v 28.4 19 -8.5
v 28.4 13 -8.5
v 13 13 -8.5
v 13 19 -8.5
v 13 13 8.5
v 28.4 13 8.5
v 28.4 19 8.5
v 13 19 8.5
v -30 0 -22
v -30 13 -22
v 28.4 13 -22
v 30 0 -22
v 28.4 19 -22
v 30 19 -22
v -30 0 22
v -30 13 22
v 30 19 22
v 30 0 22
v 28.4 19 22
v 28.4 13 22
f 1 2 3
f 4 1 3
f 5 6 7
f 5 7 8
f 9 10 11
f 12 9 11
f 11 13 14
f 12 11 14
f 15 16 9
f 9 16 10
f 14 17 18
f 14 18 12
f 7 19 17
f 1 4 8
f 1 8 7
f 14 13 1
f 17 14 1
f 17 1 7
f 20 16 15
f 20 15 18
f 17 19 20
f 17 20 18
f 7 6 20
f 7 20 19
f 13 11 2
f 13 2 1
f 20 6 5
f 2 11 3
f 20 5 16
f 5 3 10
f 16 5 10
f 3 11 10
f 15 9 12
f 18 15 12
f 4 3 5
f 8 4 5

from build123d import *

# Parameters (mm, degrees)
SKETCH_1_W          = 60
SKETCH_1_H          = 44
EXTRUDE_1_DEPTH     = 19
SKETCH_2_W          = 58.4
SKETCH_2_H          = 6
CUT_EXTRUDE_1_DEPTH = 57.542019773
SKETCH_3_W          = 15.4
SKETCH_3_H          = 17
EXTRUDE_2_DEPTH     = 6


with BuildPart() as part:
    # 草图1 → 凸台-拉伸1 (new body)
    with BuildSketch(Plane(origin=(0, 19, 0), x_dir=(1, 0, 0), z_dir=(0, 1, 0))):
        Rectangle(SKETCH_1_W, SKETCH_1_H)
    extrude(amount=-EXTRUDE_1_DEPTH)

    # 草图2 → 切除-拉伸1 (cut, through all)
    with BuildSketch(Plane(origin=(0, 0, -22), x_dir=(-1, 0, 0), z_dir=(0, 0, -1))):
        with Locations((0.8, 16)):
            Rectangle(SKETCH_2_W, SKETCH_2_H)
    extrude(amount=-CUT_EXTRUDE_1_DEPTH, mode=Mode.SUBTRACT)

    # 草图3 → 凸台-拉伸2 (add)
    with BuildSketch(Plane(origin=(0, 13, 0), x_dir=(-1, 0, 0), z_dir=(0, 1, 0))):
        with Locations((-20.7, 0)):
            Rectangle(SKETCH_3_W, SKETCH_3_H)
    extrude(amount=EXTRUDE_2_DEPTH)


solid = part.part
